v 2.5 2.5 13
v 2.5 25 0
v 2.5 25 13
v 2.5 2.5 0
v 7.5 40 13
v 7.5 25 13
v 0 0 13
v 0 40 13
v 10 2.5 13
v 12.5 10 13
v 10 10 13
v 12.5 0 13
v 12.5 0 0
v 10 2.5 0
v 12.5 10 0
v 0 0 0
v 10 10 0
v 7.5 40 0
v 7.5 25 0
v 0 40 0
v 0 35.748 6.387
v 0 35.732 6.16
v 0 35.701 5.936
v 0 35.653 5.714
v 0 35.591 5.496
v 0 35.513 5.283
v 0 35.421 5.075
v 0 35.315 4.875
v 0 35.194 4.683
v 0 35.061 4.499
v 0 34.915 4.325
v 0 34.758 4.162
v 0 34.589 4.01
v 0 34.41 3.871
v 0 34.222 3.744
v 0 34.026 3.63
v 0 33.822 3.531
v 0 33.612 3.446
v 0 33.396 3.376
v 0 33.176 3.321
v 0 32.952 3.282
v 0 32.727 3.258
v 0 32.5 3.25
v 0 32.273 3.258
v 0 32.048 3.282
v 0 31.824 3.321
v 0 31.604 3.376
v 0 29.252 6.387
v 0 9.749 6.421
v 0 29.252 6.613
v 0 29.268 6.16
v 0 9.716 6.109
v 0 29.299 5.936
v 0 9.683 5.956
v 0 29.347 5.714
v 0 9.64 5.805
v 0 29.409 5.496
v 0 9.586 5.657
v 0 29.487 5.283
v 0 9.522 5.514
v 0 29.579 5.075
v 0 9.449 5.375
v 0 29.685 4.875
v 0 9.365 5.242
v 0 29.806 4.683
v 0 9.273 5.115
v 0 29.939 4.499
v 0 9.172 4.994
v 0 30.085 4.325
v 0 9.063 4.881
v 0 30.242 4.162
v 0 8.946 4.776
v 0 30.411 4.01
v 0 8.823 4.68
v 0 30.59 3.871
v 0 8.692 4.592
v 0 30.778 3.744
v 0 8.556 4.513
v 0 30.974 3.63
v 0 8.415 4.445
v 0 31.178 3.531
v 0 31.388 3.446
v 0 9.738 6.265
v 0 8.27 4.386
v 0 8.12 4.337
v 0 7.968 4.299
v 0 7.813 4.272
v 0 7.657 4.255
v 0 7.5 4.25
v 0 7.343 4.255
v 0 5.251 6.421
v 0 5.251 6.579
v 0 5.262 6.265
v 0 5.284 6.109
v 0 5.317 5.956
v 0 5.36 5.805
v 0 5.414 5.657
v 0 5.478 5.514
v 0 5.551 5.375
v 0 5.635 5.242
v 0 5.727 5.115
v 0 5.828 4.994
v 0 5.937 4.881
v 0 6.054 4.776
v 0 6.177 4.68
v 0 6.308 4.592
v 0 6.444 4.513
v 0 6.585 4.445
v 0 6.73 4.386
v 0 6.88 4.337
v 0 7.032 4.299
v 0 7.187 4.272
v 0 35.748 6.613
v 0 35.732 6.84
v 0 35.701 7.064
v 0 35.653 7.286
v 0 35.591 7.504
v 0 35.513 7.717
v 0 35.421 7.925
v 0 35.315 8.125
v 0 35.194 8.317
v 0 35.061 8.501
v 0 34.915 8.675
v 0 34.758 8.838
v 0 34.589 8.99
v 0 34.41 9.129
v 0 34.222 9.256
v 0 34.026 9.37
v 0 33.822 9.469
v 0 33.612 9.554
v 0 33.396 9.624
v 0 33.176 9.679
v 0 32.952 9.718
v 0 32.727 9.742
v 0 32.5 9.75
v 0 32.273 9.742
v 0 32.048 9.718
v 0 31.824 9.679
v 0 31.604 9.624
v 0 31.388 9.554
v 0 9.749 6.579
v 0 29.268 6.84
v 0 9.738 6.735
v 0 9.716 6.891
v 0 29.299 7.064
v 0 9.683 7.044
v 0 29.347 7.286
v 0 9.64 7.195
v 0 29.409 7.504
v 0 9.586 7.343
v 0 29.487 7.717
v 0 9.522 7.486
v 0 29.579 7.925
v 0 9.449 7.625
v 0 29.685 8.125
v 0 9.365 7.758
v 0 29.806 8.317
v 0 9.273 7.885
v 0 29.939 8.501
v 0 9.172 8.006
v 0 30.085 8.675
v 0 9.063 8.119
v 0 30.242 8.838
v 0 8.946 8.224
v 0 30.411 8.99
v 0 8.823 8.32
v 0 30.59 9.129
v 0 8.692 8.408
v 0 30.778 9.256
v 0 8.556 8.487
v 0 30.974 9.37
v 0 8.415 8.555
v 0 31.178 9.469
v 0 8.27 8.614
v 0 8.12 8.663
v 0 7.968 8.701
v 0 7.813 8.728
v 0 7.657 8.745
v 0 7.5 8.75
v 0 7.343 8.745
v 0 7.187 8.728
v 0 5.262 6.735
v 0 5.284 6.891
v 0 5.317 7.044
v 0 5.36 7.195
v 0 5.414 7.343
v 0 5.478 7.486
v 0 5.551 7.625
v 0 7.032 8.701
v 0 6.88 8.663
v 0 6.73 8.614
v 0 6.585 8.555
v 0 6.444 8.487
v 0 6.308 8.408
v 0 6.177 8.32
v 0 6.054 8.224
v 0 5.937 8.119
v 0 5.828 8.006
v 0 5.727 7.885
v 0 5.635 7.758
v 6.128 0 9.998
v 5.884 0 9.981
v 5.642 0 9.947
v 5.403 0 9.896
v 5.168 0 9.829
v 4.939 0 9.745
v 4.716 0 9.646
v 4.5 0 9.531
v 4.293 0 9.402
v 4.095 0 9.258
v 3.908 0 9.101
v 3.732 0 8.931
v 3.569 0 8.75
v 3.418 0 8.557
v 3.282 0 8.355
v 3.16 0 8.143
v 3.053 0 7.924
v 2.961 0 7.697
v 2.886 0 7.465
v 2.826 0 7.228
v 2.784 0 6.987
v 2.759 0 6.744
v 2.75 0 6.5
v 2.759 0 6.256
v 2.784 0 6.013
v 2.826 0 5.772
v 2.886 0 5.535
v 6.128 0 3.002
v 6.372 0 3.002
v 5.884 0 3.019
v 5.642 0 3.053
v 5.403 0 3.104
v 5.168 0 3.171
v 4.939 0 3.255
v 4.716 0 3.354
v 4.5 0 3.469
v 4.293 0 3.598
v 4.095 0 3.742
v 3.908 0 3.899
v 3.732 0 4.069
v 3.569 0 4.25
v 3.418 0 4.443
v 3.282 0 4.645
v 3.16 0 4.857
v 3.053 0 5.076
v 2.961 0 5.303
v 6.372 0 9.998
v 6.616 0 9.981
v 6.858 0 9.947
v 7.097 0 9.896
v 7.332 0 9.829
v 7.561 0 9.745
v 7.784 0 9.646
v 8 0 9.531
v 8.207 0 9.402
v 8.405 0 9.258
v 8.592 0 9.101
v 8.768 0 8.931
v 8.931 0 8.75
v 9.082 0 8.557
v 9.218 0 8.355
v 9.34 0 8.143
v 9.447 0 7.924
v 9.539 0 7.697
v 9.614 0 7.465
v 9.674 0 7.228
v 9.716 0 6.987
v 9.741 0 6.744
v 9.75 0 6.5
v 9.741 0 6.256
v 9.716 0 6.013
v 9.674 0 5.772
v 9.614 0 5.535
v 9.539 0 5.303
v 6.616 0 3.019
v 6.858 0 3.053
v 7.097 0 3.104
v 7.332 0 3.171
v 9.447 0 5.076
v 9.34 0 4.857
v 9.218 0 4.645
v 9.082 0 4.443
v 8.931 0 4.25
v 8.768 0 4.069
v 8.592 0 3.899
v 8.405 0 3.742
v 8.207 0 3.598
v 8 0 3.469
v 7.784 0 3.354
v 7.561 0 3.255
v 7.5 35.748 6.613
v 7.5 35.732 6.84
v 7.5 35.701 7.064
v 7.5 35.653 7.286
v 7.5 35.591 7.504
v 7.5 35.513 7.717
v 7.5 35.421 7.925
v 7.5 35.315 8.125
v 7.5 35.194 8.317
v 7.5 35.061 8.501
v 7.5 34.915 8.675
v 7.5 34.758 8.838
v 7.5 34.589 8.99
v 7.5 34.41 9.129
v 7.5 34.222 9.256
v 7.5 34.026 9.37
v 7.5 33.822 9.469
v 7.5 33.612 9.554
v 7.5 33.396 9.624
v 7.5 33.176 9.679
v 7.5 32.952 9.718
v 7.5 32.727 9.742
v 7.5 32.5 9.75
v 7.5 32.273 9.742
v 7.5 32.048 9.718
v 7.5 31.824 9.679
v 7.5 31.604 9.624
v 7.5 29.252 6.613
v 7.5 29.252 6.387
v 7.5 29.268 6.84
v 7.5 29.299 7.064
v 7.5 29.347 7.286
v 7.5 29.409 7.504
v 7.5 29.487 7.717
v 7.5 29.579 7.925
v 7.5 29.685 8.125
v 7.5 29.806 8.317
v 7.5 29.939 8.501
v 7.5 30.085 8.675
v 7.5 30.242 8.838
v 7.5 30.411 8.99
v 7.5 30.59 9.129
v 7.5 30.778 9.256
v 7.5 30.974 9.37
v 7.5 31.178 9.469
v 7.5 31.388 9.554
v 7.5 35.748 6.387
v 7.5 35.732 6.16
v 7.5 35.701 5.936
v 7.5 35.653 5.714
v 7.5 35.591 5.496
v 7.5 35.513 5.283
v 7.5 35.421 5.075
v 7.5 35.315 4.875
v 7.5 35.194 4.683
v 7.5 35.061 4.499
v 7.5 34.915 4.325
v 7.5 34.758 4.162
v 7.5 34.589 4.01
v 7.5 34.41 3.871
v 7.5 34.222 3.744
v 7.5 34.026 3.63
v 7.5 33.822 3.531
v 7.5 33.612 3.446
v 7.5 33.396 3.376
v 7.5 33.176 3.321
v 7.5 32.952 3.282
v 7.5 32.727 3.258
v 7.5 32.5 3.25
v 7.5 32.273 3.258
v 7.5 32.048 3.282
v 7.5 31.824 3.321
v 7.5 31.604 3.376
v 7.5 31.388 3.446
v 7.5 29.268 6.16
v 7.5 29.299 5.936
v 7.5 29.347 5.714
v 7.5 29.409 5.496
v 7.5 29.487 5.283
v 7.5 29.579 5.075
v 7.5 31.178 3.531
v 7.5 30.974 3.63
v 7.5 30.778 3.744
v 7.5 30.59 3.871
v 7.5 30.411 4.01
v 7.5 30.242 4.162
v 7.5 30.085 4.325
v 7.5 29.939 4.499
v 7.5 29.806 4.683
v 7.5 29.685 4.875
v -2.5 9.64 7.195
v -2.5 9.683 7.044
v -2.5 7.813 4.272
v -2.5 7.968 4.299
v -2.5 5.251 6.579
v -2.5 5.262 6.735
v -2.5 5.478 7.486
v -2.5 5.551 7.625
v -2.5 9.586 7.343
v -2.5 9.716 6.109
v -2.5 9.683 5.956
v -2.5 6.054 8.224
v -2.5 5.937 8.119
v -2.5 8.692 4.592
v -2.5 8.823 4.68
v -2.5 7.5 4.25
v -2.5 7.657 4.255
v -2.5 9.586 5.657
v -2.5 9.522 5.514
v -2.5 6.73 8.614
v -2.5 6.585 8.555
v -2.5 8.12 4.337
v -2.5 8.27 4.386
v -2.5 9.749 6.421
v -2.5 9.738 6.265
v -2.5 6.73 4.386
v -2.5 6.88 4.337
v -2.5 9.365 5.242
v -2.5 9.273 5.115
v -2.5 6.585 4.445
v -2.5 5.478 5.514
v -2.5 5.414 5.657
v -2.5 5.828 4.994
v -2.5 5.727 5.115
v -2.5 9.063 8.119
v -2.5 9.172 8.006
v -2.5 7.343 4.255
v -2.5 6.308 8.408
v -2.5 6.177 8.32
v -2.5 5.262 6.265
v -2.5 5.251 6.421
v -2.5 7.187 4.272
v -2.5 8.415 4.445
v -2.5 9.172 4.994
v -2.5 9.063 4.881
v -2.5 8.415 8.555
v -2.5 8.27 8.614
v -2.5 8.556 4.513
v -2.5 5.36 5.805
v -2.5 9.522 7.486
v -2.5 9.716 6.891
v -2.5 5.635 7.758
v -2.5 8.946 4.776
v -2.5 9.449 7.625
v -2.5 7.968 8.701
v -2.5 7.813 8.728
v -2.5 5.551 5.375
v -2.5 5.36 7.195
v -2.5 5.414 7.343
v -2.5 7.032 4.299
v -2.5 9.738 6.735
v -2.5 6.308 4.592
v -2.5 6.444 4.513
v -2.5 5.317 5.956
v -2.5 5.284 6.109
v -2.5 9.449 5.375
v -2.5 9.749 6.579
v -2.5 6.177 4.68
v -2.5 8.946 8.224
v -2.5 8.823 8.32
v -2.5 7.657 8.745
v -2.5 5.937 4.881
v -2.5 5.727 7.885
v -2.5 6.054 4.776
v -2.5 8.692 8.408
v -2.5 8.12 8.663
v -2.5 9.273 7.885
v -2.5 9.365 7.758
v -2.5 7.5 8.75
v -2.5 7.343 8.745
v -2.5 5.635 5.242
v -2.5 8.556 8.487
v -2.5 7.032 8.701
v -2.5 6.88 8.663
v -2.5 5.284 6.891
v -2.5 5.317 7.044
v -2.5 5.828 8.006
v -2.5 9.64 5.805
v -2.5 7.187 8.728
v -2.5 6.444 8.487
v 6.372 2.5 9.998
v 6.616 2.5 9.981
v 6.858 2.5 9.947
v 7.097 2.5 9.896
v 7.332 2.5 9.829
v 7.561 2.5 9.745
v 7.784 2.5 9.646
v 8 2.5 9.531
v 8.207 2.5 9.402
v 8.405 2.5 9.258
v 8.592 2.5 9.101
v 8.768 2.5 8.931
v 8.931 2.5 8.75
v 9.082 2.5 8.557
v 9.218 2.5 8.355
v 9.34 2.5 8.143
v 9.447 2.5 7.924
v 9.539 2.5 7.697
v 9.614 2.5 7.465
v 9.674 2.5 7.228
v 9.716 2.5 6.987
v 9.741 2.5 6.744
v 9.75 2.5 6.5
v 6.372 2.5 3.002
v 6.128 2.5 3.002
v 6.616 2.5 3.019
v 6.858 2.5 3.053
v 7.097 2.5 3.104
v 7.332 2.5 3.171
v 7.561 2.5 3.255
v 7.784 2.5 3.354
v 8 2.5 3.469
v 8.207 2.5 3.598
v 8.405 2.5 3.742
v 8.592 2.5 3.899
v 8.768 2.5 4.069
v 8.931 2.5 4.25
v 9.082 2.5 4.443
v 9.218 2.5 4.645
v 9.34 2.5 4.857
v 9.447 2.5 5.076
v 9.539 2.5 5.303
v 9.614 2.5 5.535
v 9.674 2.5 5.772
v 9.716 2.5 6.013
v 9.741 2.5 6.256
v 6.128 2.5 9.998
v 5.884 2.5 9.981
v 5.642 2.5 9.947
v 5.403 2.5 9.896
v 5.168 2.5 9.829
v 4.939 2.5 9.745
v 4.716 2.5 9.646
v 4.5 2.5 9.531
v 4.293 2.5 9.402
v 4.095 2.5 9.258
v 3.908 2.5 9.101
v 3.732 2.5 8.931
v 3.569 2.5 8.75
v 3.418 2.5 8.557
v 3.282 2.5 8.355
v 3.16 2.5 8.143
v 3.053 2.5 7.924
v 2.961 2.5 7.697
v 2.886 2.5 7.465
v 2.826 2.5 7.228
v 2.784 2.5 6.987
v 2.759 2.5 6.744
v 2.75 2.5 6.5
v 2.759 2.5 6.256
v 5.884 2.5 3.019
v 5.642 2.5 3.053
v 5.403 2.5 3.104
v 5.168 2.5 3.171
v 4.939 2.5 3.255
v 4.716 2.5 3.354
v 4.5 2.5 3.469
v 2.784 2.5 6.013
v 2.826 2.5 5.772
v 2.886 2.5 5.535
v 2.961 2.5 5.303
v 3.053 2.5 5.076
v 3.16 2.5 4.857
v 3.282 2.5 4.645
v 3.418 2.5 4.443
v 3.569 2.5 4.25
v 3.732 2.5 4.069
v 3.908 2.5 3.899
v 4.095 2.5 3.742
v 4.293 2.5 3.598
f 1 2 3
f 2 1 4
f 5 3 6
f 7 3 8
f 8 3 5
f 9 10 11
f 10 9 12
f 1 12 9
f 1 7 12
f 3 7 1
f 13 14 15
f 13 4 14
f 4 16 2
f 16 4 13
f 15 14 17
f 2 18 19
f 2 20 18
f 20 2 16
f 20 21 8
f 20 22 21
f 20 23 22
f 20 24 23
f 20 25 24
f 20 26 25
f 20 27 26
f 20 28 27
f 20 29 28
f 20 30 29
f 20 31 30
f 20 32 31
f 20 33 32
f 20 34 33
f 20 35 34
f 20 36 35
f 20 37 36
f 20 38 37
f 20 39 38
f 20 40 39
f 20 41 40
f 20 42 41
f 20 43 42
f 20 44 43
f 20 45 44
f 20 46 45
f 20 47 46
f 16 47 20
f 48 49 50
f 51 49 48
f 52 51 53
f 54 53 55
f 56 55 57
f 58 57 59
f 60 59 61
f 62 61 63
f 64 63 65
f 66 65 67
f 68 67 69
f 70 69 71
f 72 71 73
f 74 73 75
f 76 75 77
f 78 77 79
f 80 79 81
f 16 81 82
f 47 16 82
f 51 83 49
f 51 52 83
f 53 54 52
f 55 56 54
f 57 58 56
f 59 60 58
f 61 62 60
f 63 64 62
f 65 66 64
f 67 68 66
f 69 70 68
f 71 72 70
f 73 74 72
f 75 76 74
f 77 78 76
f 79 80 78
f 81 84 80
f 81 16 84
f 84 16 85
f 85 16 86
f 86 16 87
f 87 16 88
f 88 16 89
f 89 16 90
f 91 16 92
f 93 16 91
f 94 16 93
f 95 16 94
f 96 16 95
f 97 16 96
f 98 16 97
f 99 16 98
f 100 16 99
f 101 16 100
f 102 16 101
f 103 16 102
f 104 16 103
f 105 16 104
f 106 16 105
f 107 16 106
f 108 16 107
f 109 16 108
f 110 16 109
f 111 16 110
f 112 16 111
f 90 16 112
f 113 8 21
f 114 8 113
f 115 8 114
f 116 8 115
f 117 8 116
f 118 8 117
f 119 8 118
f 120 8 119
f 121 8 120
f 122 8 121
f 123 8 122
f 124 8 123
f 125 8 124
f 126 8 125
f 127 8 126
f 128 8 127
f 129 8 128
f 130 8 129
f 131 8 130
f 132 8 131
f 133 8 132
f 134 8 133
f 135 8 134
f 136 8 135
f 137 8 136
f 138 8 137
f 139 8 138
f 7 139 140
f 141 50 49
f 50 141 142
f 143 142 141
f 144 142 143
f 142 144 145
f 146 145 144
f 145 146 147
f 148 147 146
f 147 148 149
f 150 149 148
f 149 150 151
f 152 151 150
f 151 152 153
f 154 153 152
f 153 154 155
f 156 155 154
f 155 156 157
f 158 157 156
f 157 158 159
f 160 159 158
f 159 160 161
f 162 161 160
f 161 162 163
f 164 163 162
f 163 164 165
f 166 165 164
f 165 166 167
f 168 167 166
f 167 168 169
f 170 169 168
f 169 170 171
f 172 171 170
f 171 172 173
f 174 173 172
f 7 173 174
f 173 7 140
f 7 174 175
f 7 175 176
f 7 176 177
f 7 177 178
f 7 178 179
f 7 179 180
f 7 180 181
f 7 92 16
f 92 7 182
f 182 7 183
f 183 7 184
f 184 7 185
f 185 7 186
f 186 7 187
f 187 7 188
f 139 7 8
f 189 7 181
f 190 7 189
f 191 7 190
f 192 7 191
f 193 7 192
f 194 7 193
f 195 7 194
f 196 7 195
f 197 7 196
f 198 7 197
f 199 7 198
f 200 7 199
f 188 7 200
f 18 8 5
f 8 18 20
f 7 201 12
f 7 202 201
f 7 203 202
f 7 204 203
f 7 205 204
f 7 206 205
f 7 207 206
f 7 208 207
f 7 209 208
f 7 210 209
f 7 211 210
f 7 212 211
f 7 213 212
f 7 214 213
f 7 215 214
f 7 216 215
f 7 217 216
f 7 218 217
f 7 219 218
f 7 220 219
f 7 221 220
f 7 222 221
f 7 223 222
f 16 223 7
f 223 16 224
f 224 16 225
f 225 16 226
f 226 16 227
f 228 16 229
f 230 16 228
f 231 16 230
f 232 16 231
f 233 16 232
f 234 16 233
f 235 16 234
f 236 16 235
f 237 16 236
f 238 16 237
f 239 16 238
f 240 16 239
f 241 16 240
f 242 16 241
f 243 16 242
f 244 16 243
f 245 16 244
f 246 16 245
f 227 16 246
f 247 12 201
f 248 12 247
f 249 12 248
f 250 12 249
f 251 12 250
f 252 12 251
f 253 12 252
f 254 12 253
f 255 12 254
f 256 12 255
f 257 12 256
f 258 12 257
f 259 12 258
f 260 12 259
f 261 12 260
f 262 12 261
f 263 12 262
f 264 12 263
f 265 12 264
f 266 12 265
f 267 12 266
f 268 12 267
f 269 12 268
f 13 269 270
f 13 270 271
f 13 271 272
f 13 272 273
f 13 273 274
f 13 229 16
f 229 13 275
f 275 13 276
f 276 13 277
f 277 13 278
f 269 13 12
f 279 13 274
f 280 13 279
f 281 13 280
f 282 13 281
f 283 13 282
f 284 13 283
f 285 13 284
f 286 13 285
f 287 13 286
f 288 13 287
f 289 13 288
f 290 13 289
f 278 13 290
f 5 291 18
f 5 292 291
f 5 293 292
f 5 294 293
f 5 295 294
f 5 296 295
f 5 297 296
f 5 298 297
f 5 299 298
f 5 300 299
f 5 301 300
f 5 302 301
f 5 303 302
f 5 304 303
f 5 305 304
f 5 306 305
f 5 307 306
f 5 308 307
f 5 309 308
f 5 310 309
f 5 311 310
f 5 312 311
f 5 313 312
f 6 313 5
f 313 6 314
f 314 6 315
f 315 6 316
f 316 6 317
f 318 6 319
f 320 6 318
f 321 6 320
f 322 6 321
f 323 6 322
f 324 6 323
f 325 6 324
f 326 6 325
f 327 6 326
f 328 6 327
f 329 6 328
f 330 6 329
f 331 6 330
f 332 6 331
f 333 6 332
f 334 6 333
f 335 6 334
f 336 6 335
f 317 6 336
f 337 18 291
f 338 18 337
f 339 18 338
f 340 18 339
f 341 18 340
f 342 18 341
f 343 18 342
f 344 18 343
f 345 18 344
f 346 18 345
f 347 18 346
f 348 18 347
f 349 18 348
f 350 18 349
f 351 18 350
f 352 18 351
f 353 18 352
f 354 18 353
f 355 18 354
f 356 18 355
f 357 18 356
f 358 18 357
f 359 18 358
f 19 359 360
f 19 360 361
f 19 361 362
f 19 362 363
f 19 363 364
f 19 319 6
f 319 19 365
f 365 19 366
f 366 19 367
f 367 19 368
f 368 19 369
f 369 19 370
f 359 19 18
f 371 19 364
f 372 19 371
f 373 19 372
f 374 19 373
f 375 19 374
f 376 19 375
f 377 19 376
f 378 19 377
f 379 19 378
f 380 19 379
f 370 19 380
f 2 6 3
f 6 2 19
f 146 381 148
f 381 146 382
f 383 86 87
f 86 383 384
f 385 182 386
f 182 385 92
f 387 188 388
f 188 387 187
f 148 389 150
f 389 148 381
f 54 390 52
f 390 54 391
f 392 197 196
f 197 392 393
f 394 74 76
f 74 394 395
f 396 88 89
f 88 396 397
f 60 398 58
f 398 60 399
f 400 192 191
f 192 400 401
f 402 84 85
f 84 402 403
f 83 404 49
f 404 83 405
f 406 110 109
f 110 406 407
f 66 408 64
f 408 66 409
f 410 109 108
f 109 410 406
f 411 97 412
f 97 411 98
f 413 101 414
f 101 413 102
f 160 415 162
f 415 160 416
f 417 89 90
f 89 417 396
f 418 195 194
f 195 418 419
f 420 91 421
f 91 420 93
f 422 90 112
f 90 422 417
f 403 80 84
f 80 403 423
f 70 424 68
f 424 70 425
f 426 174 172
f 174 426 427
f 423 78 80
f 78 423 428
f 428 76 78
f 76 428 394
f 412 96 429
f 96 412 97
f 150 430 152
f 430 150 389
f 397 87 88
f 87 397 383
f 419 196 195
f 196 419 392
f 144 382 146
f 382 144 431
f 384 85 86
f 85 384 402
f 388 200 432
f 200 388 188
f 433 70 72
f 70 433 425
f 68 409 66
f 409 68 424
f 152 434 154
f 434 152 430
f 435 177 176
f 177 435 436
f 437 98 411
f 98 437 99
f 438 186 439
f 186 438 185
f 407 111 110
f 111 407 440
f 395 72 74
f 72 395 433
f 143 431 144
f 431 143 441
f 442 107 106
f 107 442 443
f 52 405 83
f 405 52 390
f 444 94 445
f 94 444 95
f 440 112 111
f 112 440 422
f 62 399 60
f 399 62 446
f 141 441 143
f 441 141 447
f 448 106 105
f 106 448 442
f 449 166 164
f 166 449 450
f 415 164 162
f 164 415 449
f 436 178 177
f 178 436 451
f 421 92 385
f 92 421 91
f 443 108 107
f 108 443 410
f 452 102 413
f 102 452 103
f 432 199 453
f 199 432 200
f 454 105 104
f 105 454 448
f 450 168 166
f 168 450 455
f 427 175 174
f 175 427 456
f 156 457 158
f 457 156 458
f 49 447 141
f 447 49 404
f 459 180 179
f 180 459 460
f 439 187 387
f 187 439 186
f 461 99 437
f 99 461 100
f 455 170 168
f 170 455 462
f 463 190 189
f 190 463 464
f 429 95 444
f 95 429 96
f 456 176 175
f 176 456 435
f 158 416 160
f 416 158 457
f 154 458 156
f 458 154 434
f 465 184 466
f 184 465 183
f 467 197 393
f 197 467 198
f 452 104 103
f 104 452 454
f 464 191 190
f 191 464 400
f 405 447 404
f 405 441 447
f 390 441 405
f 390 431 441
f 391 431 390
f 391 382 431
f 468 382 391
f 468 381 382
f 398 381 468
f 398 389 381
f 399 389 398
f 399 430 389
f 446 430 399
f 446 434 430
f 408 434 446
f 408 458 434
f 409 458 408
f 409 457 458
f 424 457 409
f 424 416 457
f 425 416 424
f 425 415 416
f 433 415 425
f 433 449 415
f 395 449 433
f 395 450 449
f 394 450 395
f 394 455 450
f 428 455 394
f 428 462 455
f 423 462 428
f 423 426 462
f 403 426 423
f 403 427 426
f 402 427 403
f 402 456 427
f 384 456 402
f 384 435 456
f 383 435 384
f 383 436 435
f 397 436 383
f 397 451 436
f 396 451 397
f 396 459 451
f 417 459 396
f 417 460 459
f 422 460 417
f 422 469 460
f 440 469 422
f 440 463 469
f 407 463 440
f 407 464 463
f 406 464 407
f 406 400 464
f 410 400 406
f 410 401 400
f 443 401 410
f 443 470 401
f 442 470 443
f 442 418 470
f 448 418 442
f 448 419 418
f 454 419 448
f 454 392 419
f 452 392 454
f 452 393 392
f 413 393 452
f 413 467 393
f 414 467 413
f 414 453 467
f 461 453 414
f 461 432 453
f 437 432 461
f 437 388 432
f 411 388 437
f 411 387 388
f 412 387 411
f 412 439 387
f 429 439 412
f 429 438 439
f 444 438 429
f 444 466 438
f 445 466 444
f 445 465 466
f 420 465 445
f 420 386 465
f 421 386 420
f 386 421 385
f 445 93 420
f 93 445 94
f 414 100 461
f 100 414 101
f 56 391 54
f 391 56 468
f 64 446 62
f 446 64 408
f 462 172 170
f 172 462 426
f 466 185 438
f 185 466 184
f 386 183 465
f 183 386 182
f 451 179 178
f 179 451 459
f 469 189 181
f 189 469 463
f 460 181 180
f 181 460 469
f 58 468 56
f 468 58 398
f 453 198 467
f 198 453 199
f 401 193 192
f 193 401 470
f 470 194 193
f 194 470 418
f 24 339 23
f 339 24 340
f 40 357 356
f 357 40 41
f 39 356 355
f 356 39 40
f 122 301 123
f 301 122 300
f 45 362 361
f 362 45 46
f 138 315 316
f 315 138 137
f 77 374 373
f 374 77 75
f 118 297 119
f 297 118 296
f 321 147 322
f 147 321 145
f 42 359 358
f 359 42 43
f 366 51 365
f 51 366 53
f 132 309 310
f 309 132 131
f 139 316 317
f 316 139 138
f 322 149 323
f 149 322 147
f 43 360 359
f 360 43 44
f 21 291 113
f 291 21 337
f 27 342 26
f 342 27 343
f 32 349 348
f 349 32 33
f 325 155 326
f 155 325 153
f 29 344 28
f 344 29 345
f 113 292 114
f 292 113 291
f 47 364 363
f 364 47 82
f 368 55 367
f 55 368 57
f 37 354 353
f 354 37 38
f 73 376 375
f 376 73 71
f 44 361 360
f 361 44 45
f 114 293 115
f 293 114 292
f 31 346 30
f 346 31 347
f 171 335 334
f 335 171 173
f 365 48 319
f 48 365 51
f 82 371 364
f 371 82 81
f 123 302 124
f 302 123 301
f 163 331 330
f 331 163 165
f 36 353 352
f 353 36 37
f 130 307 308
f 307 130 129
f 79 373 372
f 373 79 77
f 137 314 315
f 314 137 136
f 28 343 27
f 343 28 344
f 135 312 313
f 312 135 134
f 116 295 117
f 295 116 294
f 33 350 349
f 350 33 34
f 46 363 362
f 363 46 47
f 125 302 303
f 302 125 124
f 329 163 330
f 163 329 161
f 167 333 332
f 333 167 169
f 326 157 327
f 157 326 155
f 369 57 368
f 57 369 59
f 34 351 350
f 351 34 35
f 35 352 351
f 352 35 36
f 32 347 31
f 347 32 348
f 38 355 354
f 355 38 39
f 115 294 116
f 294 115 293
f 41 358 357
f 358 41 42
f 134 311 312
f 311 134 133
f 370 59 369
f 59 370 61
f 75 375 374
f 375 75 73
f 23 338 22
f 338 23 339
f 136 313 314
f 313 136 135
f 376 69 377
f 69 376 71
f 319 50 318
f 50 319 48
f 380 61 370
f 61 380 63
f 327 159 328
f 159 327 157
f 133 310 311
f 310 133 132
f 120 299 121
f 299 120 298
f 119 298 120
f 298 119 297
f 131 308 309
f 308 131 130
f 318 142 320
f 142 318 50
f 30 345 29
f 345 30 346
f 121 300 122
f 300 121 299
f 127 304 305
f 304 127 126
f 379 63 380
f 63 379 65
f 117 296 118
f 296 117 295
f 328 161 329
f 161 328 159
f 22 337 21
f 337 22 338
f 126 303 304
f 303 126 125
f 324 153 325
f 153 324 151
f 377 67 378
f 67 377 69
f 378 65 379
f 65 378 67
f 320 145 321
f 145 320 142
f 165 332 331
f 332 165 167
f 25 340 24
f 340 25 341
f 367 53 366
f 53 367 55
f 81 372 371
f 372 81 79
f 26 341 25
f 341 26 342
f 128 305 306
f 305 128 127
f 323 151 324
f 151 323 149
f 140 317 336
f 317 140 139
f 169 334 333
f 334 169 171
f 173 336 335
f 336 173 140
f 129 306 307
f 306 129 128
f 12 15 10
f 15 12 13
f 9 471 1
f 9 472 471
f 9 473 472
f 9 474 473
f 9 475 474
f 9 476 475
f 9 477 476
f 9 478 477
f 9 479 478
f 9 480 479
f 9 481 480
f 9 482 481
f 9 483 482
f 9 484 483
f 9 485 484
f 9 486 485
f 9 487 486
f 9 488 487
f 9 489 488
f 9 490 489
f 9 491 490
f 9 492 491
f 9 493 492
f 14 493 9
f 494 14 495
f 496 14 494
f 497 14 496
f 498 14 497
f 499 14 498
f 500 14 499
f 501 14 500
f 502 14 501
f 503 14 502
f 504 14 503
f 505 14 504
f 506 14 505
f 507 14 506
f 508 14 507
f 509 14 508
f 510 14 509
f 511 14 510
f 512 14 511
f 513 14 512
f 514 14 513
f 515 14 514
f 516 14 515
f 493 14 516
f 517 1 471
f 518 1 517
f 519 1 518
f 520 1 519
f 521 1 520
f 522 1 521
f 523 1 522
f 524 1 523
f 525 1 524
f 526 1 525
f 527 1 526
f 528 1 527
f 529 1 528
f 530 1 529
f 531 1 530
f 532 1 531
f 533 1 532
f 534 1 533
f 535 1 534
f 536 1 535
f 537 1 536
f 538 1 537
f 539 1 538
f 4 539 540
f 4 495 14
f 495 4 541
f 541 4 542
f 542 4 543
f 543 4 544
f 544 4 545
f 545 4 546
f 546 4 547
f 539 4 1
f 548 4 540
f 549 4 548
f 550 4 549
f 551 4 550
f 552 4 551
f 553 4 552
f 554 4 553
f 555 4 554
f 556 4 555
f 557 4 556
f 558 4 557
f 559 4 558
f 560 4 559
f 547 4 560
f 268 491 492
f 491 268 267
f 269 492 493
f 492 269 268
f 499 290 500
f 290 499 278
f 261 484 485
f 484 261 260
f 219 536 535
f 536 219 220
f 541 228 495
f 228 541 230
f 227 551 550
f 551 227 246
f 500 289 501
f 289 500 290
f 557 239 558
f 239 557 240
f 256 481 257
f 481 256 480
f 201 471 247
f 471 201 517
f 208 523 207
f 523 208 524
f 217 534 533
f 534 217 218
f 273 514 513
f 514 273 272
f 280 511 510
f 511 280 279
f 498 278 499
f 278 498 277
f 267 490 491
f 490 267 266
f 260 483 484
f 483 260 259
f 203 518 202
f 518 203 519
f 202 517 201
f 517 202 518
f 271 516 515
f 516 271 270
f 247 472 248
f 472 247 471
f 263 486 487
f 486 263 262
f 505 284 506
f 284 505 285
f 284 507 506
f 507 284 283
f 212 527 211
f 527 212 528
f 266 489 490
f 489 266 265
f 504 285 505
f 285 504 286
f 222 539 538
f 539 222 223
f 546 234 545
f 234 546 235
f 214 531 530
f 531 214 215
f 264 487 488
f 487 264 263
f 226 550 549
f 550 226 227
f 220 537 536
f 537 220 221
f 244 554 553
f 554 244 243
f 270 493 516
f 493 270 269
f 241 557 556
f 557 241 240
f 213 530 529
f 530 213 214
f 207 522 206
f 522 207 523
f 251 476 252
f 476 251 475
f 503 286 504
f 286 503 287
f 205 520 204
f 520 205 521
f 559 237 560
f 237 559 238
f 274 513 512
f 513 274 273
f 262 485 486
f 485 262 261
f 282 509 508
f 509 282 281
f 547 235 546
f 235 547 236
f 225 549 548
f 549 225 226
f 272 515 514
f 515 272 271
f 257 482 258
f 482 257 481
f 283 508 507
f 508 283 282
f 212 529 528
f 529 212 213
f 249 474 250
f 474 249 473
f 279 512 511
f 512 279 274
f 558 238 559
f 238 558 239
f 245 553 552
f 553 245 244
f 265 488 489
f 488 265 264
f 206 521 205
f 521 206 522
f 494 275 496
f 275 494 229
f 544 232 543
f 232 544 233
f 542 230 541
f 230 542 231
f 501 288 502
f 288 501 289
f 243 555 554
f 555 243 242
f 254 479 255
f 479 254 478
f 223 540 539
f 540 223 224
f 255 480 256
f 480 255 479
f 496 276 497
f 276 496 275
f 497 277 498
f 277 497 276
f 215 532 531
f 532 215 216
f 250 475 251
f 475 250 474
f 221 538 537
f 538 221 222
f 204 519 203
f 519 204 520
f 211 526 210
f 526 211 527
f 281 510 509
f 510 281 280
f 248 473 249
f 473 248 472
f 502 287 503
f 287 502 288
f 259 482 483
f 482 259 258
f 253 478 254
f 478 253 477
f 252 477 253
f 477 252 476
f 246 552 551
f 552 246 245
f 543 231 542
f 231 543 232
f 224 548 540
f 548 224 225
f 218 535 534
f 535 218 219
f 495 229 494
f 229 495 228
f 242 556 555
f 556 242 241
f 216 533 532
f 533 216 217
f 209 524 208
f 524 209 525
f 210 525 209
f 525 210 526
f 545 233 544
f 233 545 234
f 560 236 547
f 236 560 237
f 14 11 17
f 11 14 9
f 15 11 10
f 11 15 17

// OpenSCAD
$fa=4; // default minimum facet angle is now 4
$fs=0.05; // default minimum facet size is now 0.05 mm

union() {
  difference() {
    union() {
      cube([2.5, 40, 13]);
      translate([0, 25, 0]) cube([7.5, 15, 13]);
      translate([-2.5, 7.5, 6.5]) rotate([0, 90, 0]) cylinder(h = 2.6, r=2.25);
    }
    translate([-1, 32.5, 6.5]) rotate([0, 90, 0]) cylinder(h = 15, r=3.25);
  }
  difference() {
    cube([12.5, 2.5, 13]);
    translate([6.25, 2.6, 6.5]) rotate([90, 0, 0]) cylinder(h=5, r=3.5);
  }
  translate([10, 0, 0]) cube([2.5, 10, 13]);
}
